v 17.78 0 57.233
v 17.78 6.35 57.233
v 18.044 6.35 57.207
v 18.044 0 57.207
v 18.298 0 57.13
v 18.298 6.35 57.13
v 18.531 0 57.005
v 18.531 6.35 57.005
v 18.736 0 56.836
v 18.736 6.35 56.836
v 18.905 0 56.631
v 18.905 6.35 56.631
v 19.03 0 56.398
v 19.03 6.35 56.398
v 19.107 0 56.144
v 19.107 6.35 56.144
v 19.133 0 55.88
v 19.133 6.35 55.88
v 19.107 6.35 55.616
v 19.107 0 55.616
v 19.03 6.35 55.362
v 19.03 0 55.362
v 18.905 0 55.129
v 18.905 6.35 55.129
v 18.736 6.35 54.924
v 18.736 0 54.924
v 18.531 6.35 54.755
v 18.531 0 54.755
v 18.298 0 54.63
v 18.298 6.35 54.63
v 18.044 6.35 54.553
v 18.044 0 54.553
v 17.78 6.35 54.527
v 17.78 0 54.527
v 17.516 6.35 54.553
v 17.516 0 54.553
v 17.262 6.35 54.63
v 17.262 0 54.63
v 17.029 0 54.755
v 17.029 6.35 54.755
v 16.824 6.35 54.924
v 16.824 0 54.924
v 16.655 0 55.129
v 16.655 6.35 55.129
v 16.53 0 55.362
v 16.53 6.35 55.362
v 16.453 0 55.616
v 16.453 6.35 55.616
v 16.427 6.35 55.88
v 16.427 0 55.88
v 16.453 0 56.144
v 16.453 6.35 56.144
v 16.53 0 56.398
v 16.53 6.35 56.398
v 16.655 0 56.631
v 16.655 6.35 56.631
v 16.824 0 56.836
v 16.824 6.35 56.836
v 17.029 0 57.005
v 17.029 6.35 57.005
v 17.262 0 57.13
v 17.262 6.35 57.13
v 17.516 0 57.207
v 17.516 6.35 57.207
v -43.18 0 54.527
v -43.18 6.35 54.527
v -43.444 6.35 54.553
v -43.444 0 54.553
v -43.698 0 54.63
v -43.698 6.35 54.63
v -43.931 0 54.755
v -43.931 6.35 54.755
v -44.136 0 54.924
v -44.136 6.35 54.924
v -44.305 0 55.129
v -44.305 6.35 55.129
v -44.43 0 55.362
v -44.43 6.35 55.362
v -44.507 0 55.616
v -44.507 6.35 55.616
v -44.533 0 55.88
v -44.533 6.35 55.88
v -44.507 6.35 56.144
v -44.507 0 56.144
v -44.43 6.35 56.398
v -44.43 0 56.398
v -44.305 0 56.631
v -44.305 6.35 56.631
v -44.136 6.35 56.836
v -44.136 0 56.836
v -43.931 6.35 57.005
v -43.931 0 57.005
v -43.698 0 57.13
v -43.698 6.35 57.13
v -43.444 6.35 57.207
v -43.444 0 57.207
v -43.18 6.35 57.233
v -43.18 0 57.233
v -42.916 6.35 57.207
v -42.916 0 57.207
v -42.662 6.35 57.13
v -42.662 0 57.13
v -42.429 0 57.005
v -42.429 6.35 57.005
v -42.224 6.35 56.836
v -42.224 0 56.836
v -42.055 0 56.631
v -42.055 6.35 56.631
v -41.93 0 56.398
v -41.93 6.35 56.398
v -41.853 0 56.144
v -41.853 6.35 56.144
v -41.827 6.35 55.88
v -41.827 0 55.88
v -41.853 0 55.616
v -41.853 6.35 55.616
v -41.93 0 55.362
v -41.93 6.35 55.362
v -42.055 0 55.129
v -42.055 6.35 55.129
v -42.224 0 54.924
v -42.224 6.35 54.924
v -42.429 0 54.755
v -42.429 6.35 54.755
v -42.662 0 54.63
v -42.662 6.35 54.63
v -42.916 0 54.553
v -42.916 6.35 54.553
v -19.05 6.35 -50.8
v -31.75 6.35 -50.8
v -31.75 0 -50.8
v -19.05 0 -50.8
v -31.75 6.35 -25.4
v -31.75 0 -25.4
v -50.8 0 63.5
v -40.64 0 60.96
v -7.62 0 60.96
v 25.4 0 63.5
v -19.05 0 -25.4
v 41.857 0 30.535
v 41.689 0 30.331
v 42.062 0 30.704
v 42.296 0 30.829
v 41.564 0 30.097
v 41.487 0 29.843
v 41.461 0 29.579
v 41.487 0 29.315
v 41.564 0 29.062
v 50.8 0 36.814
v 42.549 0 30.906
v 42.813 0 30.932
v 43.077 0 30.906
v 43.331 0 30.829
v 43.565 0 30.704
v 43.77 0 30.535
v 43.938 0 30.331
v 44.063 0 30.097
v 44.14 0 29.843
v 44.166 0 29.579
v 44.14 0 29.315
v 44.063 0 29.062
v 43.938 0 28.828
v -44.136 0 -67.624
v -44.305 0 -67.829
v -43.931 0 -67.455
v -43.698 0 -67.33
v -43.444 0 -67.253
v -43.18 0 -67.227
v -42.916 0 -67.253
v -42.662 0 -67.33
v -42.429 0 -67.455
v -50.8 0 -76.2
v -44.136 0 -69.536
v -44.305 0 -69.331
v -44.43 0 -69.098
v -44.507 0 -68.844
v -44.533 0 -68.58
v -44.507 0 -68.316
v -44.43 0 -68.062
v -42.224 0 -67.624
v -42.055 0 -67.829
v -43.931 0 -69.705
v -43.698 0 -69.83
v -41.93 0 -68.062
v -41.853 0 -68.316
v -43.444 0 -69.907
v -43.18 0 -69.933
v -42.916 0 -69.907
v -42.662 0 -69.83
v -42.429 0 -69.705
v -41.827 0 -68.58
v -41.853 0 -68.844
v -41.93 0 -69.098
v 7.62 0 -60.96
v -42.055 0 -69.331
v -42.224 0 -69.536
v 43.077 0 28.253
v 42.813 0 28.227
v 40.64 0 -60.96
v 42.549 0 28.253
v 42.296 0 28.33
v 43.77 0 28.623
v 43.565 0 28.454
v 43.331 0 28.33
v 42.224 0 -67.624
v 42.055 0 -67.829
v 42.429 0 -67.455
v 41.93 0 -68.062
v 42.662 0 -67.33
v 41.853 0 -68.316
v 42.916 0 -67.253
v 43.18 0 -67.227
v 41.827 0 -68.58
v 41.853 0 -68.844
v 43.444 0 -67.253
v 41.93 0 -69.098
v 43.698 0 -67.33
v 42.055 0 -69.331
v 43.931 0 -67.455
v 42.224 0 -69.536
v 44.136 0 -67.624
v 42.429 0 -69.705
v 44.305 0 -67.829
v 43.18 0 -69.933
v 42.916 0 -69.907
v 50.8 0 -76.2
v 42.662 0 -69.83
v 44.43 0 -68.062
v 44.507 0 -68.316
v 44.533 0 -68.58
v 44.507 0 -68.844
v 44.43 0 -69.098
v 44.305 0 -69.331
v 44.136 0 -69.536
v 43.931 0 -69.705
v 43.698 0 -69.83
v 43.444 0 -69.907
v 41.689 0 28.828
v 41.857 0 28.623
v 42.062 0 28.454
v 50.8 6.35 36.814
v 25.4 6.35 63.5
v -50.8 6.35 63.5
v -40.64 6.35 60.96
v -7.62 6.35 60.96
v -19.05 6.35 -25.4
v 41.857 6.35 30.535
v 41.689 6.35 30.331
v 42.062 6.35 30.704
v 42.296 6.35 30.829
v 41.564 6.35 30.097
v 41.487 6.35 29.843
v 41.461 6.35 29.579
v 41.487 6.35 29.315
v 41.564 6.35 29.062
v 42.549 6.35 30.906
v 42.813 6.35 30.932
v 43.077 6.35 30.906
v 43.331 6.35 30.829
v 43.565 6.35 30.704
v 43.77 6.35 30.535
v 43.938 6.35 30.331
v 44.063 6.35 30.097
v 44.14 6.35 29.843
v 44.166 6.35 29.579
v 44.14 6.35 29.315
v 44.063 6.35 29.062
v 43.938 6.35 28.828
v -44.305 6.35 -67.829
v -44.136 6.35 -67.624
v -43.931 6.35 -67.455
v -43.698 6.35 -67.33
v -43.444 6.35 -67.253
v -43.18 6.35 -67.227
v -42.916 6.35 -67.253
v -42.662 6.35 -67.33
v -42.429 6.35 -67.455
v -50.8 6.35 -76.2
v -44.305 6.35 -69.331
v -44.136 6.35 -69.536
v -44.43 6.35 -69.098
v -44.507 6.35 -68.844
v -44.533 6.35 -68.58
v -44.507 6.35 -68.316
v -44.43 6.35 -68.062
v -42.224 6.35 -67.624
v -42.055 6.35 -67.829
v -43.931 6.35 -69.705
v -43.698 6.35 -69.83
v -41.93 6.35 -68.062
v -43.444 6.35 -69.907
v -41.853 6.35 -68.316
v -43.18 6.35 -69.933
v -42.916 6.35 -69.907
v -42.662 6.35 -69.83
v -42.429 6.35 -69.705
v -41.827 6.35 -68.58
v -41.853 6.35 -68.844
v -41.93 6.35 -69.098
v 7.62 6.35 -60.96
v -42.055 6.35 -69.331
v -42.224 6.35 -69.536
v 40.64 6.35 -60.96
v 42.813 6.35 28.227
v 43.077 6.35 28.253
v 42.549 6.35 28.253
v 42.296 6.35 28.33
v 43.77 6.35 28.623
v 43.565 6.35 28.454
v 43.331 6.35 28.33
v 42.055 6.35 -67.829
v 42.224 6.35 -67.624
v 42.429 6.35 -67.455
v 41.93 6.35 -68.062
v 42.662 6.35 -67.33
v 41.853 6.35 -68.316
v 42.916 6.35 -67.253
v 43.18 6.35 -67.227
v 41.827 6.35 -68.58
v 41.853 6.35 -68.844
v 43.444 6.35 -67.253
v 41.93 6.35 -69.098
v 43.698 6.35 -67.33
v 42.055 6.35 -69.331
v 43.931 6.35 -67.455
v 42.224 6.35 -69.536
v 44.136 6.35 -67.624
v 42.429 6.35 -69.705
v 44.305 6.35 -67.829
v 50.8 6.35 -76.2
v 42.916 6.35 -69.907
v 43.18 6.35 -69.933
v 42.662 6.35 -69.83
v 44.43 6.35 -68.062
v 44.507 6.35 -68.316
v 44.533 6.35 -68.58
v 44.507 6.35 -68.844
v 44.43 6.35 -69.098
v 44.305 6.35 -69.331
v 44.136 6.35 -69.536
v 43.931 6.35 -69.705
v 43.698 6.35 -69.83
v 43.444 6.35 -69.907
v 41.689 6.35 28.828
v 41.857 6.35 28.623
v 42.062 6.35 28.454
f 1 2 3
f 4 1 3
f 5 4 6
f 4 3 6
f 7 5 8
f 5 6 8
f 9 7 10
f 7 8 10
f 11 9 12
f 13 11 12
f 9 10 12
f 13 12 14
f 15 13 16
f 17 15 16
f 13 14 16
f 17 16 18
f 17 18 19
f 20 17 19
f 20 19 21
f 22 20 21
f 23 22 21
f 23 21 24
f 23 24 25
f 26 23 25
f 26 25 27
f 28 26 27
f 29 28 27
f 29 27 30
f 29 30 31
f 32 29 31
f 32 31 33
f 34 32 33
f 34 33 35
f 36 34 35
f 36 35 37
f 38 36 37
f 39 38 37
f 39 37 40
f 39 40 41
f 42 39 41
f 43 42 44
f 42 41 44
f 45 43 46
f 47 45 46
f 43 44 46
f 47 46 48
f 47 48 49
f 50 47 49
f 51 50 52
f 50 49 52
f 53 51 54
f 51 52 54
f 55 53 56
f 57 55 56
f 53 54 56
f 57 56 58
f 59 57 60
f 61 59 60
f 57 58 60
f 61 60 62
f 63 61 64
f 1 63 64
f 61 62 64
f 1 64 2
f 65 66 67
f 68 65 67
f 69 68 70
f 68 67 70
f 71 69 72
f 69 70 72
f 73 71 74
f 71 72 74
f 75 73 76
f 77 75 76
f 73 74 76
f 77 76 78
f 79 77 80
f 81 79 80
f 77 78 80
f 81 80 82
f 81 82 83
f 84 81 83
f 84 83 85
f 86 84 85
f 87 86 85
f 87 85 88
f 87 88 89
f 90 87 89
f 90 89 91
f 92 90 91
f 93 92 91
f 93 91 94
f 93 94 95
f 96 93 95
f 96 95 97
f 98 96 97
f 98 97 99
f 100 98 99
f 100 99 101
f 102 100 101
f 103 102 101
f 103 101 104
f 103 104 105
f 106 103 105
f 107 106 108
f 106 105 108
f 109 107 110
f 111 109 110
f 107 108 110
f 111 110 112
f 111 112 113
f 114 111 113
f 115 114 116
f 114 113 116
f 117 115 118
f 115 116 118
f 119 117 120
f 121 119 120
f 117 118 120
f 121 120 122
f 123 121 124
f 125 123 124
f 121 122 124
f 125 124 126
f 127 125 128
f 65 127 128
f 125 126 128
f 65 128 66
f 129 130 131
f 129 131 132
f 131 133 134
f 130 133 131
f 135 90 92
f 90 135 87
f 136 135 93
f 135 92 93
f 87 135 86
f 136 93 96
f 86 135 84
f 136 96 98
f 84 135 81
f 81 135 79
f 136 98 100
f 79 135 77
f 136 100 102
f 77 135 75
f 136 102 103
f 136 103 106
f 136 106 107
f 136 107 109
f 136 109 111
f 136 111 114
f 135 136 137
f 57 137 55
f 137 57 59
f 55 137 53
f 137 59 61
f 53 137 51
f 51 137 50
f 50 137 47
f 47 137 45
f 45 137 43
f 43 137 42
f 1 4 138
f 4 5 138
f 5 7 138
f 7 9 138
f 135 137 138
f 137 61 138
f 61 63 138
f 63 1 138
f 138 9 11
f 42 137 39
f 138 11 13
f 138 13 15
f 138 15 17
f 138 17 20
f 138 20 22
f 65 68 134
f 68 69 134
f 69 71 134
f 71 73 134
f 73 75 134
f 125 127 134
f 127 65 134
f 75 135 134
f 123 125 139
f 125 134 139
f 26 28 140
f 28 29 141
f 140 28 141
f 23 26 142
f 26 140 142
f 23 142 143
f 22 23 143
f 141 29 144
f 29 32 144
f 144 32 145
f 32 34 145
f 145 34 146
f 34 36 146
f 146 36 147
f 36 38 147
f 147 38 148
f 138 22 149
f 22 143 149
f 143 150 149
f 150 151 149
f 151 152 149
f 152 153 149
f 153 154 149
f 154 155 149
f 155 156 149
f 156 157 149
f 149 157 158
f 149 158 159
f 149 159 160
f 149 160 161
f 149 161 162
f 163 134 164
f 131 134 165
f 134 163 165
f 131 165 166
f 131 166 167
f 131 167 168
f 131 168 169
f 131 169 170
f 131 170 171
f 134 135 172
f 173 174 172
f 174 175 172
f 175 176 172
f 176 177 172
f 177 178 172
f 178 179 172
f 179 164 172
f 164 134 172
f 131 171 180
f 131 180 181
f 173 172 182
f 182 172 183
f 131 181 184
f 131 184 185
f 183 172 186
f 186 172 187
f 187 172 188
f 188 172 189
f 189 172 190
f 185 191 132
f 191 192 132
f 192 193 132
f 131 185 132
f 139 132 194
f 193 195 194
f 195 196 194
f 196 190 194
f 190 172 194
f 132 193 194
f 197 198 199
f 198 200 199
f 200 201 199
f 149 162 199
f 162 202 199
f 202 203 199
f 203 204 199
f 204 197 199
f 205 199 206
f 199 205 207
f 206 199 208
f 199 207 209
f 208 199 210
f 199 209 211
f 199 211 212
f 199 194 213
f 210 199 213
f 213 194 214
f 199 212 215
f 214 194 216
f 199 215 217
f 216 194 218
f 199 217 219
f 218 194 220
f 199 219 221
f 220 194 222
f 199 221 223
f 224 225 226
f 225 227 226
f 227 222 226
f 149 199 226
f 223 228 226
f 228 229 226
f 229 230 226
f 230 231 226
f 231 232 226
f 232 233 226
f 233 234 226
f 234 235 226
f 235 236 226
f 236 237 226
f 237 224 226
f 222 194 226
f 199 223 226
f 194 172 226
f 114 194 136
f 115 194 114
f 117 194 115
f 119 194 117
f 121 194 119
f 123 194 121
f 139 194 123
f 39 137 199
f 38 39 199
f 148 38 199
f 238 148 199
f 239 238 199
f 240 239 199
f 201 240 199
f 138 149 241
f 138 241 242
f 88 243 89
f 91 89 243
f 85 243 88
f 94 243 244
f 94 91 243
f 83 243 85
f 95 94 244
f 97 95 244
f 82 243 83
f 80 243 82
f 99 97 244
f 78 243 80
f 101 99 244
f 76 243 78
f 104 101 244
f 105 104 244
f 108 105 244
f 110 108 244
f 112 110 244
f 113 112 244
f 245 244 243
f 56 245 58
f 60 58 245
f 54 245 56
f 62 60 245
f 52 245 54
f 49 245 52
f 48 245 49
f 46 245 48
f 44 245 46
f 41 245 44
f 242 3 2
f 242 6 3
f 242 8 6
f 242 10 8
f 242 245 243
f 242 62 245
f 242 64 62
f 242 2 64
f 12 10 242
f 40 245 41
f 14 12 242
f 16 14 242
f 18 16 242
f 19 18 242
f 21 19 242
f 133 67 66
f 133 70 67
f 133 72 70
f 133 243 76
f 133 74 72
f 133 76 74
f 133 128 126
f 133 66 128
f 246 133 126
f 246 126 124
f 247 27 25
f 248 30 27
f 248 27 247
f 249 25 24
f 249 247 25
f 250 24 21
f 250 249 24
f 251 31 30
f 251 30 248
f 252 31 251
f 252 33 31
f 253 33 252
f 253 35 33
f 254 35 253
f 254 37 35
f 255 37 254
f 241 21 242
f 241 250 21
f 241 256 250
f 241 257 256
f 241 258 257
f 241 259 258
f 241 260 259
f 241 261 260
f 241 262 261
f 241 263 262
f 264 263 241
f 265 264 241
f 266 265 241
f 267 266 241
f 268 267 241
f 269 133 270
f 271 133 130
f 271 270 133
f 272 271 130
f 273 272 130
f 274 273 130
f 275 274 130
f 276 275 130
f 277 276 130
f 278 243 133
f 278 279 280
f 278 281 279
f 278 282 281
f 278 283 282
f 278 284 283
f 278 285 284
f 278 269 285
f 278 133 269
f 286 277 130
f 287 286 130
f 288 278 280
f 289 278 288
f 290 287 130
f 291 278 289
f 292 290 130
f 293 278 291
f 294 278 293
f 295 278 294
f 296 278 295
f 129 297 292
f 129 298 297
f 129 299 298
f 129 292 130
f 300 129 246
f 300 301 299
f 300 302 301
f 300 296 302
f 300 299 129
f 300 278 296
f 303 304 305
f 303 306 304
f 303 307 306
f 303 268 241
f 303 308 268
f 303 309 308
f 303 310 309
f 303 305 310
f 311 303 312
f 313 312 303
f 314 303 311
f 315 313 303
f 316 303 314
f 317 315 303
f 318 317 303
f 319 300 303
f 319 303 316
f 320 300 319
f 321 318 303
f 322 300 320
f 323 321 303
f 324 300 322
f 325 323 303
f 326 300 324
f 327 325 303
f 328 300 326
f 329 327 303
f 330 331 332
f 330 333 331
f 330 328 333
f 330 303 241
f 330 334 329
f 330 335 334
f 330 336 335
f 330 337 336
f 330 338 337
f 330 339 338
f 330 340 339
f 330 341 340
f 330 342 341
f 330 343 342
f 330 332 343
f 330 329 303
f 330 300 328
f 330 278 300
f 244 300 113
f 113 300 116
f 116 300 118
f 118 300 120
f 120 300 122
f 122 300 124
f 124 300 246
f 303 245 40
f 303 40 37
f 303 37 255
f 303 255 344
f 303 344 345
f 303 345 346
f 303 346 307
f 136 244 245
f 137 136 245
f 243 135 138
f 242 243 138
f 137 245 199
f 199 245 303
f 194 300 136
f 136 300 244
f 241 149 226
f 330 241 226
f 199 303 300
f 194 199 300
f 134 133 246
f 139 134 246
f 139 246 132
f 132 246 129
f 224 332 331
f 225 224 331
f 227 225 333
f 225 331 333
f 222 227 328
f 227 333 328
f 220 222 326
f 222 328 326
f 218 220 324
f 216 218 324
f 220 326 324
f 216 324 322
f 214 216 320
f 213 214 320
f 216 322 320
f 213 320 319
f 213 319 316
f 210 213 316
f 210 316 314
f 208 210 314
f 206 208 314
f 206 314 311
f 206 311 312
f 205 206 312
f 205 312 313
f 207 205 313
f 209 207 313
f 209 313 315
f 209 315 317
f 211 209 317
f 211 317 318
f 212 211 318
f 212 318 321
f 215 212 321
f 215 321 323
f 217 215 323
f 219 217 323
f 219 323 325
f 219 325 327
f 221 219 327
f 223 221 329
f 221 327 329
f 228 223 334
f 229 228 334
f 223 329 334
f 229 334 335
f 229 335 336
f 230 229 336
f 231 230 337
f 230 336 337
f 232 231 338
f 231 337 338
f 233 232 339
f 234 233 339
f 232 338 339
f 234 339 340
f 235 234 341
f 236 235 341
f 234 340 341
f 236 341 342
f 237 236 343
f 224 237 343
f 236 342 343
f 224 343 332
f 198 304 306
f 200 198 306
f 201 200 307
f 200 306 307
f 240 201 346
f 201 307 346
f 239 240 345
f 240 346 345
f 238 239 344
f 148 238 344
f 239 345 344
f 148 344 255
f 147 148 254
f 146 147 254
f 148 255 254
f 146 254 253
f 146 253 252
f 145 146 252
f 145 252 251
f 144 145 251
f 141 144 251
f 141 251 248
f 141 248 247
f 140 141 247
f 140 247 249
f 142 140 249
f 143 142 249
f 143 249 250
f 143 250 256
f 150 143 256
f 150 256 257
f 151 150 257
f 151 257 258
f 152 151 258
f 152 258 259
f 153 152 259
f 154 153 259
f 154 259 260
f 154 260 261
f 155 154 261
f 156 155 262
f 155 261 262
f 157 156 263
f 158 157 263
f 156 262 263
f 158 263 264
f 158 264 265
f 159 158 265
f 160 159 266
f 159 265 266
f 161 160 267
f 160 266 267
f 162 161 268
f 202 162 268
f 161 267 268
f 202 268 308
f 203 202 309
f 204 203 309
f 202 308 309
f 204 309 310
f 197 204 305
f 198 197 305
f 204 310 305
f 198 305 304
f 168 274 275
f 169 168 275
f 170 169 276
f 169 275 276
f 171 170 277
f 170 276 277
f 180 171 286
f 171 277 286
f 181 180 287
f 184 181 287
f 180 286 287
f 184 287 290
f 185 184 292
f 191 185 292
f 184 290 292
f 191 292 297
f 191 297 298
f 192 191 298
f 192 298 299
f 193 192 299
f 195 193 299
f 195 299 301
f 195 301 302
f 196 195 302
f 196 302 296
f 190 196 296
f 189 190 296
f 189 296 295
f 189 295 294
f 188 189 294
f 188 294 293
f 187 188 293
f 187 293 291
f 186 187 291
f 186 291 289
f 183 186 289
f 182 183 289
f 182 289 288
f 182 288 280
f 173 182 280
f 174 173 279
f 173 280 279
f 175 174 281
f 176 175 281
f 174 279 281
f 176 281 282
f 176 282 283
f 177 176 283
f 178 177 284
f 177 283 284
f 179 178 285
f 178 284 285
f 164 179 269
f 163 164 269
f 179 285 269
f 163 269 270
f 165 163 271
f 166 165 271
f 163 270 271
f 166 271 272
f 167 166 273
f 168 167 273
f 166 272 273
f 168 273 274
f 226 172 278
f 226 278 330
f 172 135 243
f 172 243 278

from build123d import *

# Parameters (mm, degrees)
SKETCH1_W               = 101.6
SKETCH1_H               = 139.7
BOSS_EXTRUDE1_DEPTH     = 6.35
CUT_EXTRUDE1_DEPTH      = 92.800885072
CUT_EXTRUDE4_DEPTH      = 92.800885072
CUT_EXTRUDE4_DEPTH_BACK = 6.35
CUT_EXTRUDE5_DEPTH      = 6.35
SKETCH11_W              = 12.7
SKETCH11_H              = 25.4
CUT_EXTRUDE6_DEPTH      = 6.35
SKETCH12_R              = 1.35255
CUT_EXTRUDE7_DEPTH      = 92.800885072


with BuildPart() as part:
    # Sketch1 → Boss-Extrude1 (new body)
    with BuildSketch(Plane(origin=(0, 0, 0), x_dir=(1, 0, 0), z_dir=(0, 1, 0))):
        with Locations((0, 6.35)):
            Rectangle(SKETCH1_W, SKETCH1_H)
    extrude(amount=BOSS_EXTRUDE1_DEPTH)

    # Sketch3 → Cut-Extrude1 (cut, through all)
    with BuildSketch(Plane(origin=(0, 6.35, 0), x_dir=(1, 0, 0), z_dir=(0, 1, 0))):
        with BuildLine():
            Line((-1.486564617, 31.962640907), (30.263435383, 59.140640907))
            ThreePointArc((30.263435383, 59.140640907), (33.486640907, 58.890564617), (33.236564617, 55.667359093))
            Line((33.236564617, 55.667359093), (1.486564617, 28.489359093))
            ThreePointArc((1.486564617, 28.489359093), (-1.736640907, 28.739435383), (-1.486564617, 31.962640907))
        make_face()
        with BuildLine():
            Line((1.486564617, -31.962640907), (-30.263435383, -59.140640907))
            ThreePointArc((-30.263435383, -59.140640907), (-33.486640907, -58.890564617), (-33.236564617, -55.667359093))
            Line((-33.236564617, -55.667359093), (-1.486564617, -28.489359093))
            ThreePointArc((-1.486564617, -28.489359093), (1.736640907, -28.739435383), (1.486564617, -31.962640907))
        make_face()
    extrude(amount=-CUT_EXTRUDE1_DEPTH, mode=Mode.SUBTRACT)

    # Sketch7 → Cut-Extrude4 (cut, two sides: drawn at the far end of the back side and taken through both)
    with BuildSketch(Plane(origin=(0, 6.35, 0), x_dir=(1, 0, 0), z_dir=(0, 1, 0)).offset(-CUT_EXTRUDE4_DEPTH_BACK)):
        Polygon((277.114298269, 200.961809181), (50.8, -36.813673481), (25.4, -63.5), (-200.914298269, -301.275482661), (274.636667054, -753.904079199), (752.665263592, -251.666787357), align=None)
    extrude(amount=CUT_EXTRUDE4_DEPTH + CUT_EXTRUDE4_DEPTH_BACK, mode=Mode.SUBTRACT)

    # Sketch10 → Cut-Extrude5 (cut)
    with BuildSketch(Plane(origin=(0, 6.35, 0), x_dir=(1, 0, 0), z_dir=(0, 1, 0))):
        Polygon((-40.64, -60.96), (-7.62, -60.96), (40.64, 60.96), (7.62, 60.96), align=None)
    extrude(amount=-CUT_EXTRUDE5_DEPTH, mode=Mode.SUBTRACT)

    # Sketch11 → Cut-Extrude6 (cut)
    with BuildSketch(Plane(origin=(0, 6.35, 0), x_dir=(1, 0, 0), z_dir=(0, 1, 0))):
        with Locations((-25.4, 38.1)):
            Rectangle(SKETCH11_W, SKETCH11_H)
    extrude(amount=-CUT_EXTRUDE6_DEPTH, mode=Mode.SUBTRACT)

    # Sketch12 → Cut-Extrude7 (cut, through all)
    with BuildSketch(Plane(origin=(0, 6.35, 0), x_dir=(1, 0, 0), z_dir=(0, 1, 0))):
        with Locations(Location((-43.18, 68.58, 0), (0, 0, 270))):
            Circle(SKETCH12_R)
        with Locations(Location((43.18, 68.58, 0), (0, 0, 90))):
            Circle(SKETCH12_R)
        with Locations(Location((-43.18, -55.88, 0), (0, 0, 90))):
            Circle(SKETCH12_R)
        with Locations(Location((17.78, -55.88, 0), (0, 0, 270))):
            Circle(SKETCH12_R)
        with Locations(Location((42.813150737, -29.579101009, 0), (0, 0, 90))):
            Circle(SKETCH12_R)
    extrude(amount=-CUT_EXTRUDE7_DEPTH, mode=Mode.SUBTRACT)


solid = part.part
